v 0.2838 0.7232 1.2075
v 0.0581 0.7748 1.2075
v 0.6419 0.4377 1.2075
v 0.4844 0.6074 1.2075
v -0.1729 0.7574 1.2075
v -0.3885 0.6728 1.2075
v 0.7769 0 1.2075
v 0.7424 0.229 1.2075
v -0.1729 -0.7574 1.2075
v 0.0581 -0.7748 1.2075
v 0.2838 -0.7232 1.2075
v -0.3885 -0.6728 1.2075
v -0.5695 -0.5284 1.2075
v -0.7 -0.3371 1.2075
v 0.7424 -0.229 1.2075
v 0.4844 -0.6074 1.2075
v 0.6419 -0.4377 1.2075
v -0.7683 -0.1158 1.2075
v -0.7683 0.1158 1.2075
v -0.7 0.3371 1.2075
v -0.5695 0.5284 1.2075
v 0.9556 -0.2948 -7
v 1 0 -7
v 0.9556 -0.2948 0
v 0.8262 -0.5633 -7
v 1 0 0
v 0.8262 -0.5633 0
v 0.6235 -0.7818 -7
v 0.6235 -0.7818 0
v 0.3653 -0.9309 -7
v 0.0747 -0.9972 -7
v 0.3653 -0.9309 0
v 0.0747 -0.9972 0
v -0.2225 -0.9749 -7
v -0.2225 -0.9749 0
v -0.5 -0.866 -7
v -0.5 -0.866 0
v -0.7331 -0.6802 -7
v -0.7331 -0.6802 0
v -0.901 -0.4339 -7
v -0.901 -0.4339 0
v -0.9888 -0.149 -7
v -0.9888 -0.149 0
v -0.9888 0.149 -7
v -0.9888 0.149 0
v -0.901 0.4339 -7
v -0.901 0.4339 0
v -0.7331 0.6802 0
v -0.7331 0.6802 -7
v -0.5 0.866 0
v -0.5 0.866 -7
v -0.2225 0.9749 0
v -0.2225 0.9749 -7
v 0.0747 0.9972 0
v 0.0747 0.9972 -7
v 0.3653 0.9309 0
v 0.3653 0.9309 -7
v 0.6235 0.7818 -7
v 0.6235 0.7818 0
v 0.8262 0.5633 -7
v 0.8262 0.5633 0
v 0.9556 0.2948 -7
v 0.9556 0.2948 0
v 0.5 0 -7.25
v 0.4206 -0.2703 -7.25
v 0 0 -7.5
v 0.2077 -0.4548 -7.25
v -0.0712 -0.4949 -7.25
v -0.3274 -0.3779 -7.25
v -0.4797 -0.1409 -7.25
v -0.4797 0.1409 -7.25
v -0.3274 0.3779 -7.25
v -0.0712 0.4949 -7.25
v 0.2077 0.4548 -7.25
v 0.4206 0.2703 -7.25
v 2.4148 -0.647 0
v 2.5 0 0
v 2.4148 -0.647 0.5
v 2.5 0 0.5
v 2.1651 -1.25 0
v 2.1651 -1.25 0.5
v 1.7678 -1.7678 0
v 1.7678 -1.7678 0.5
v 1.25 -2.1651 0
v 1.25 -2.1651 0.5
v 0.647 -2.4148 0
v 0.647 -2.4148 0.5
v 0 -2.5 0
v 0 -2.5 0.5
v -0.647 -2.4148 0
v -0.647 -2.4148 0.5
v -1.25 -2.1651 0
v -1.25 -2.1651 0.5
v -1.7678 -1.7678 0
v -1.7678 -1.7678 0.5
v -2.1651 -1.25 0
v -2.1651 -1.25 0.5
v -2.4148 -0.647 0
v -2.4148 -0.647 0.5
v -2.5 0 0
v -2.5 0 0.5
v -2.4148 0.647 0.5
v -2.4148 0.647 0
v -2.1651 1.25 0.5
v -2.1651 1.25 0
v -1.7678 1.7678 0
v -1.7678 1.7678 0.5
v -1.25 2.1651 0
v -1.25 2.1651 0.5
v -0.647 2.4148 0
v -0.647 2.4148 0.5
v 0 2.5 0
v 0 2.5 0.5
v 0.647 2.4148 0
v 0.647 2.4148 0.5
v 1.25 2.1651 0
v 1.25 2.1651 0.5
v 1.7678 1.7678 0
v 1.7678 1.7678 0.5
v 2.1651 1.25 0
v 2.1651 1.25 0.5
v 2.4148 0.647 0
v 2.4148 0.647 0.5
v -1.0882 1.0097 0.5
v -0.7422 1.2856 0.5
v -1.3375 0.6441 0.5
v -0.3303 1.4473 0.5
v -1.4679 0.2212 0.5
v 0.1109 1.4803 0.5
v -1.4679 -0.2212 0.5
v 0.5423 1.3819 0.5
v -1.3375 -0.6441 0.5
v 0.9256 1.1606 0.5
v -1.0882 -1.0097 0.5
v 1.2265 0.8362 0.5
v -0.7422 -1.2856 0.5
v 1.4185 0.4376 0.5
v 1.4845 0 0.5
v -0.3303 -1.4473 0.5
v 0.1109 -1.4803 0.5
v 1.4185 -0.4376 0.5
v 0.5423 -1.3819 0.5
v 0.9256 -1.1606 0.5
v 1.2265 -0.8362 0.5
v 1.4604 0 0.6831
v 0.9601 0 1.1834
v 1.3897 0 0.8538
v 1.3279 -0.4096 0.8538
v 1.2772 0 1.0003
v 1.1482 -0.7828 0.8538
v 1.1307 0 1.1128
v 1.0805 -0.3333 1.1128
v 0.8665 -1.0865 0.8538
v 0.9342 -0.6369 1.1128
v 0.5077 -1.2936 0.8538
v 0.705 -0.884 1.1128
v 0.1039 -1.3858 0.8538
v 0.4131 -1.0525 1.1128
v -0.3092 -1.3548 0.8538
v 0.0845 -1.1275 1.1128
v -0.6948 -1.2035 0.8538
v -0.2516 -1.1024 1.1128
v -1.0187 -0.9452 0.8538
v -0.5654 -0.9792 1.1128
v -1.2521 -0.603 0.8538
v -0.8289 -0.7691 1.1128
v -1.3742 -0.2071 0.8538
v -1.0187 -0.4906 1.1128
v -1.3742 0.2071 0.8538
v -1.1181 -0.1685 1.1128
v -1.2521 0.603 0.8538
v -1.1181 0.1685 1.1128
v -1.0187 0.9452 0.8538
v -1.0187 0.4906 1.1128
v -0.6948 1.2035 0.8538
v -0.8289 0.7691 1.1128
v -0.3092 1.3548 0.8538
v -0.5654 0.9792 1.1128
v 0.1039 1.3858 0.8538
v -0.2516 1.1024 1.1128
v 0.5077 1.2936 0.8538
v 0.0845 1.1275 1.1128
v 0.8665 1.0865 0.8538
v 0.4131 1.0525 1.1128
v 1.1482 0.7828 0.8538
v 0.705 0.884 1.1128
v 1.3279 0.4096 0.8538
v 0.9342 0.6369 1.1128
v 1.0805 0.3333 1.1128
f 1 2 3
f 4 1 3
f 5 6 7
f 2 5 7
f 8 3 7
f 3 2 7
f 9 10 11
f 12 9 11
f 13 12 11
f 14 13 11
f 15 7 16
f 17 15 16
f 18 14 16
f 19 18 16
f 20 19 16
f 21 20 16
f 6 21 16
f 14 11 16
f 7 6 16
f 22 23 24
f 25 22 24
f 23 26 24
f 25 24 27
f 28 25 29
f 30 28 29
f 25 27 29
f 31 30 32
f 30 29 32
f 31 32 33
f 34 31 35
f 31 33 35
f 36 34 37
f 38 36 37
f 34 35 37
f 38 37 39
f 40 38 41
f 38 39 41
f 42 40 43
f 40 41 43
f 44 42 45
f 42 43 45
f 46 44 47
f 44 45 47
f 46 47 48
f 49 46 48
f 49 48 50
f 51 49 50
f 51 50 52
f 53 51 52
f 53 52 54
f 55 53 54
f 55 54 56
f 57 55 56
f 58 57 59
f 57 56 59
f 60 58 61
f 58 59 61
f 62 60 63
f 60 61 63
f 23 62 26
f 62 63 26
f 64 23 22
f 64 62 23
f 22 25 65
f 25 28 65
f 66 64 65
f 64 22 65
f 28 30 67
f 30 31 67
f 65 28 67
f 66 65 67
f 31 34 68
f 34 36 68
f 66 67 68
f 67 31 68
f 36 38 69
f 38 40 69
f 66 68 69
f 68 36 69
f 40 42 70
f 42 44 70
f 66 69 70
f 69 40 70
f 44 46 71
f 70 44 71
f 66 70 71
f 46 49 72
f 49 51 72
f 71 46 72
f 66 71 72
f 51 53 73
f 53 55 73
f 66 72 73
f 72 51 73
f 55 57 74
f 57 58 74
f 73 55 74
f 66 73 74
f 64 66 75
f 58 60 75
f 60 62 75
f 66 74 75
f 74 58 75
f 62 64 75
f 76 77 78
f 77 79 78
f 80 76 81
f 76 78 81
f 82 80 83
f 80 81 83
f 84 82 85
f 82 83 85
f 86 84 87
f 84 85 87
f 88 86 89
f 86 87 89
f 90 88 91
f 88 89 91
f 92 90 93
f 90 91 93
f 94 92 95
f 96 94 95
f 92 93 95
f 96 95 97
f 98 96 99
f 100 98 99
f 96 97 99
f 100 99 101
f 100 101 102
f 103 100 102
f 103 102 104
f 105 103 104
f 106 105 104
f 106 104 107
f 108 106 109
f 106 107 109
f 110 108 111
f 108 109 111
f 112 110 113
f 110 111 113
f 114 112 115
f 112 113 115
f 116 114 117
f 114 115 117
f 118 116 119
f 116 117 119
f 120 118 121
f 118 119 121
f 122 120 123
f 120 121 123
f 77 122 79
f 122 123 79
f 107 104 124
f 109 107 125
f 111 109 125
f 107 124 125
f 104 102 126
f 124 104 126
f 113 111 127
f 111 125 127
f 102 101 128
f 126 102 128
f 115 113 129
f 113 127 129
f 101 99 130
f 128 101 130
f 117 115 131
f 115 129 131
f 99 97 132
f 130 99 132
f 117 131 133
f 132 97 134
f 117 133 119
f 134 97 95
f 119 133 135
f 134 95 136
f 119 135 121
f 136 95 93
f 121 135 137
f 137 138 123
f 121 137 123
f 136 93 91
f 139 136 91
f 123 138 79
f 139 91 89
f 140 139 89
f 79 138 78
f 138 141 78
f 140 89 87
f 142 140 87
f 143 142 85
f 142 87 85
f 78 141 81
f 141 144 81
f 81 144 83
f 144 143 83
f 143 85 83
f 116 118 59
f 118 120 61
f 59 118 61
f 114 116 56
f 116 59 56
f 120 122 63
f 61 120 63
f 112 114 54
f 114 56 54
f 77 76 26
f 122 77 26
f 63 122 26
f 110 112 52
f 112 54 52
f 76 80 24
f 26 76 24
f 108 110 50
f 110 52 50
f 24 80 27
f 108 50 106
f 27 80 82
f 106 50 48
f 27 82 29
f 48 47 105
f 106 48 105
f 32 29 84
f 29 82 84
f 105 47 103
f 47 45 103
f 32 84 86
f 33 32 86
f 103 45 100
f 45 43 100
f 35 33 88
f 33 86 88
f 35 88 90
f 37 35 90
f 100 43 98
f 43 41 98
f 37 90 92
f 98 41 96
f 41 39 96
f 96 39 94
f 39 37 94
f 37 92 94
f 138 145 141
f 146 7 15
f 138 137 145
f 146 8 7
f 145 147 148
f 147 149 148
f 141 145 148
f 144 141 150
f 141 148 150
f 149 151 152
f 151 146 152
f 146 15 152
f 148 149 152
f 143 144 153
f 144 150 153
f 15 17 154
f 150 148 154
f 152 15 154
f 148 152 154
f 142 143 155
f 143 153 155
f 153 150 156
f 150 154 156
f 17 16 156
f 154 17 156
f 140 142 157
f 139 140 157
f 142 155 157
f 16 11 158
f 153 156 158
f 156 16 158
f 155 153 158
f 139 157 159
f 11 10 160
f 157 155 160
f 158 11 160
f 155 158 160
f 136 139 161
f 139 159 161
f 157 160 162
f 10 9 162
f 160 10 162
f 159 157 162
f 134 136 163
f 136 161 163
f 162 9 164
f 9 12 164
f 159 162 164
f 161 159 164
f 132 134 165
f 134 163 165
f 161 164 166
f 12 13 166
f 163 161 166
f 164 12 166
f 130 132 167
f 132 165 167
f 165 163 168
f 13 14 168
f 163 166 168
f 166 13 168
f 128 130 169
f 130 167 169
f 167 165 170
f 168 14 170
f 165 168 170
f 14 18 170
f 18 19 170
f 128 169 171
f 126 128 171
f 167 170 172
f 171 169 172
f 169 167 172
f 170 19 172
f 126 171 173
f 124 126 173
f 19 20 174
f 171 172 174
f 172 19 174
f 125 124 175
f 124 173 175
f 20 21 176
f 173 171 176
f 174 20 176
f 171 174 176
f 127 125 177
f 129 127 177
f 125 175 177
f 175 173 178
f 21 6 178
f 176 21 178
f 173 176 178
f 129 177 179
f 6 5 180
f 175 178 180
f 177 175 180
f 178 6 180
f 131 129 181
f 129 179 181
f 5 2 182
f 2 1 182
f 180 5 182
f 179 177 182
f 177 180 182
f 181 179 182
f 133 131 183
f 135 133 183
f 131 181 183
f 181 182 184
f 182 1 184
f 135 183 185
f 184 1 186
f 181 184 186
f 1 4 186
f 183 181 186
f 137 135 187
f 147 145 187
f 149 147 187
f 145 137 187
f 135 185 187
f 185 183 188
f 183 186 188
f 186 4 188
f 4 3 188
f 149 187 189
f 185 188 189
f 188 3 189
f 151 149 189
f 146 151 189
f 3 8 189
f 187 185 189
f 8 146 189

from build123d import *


with BuildPart() as f1:
    # F0 (on Front) → F1 (revolve)
    with BuildSketch(Plane.XZ):
        with BuildLine():
            Line((0, 0.5), (0, 0))
            Line((0, 0), (0, -7.5))
            Line((0, -7.5), (1, -7))
            Line((1, -7), (1, 0))
            Line((1, 0), (2.5, 0))
            Line((2.5, 0), (2.5, 0.5))
            Line((2.5, 0.5), (1.484474, 0.5))
            ThreePointArc((1.484474, 0.5), (1.277239, 1.00031), (0.776929, 1.207545))
            Line((0.776929, 1.207545), (0, 1.207545))
            Line((0, 1.207545), (0, 0.5))
        make_face()
    revolve(axis=Axis((0, 0, -3.75), (0, 0, -1)))


solid = f1.part
